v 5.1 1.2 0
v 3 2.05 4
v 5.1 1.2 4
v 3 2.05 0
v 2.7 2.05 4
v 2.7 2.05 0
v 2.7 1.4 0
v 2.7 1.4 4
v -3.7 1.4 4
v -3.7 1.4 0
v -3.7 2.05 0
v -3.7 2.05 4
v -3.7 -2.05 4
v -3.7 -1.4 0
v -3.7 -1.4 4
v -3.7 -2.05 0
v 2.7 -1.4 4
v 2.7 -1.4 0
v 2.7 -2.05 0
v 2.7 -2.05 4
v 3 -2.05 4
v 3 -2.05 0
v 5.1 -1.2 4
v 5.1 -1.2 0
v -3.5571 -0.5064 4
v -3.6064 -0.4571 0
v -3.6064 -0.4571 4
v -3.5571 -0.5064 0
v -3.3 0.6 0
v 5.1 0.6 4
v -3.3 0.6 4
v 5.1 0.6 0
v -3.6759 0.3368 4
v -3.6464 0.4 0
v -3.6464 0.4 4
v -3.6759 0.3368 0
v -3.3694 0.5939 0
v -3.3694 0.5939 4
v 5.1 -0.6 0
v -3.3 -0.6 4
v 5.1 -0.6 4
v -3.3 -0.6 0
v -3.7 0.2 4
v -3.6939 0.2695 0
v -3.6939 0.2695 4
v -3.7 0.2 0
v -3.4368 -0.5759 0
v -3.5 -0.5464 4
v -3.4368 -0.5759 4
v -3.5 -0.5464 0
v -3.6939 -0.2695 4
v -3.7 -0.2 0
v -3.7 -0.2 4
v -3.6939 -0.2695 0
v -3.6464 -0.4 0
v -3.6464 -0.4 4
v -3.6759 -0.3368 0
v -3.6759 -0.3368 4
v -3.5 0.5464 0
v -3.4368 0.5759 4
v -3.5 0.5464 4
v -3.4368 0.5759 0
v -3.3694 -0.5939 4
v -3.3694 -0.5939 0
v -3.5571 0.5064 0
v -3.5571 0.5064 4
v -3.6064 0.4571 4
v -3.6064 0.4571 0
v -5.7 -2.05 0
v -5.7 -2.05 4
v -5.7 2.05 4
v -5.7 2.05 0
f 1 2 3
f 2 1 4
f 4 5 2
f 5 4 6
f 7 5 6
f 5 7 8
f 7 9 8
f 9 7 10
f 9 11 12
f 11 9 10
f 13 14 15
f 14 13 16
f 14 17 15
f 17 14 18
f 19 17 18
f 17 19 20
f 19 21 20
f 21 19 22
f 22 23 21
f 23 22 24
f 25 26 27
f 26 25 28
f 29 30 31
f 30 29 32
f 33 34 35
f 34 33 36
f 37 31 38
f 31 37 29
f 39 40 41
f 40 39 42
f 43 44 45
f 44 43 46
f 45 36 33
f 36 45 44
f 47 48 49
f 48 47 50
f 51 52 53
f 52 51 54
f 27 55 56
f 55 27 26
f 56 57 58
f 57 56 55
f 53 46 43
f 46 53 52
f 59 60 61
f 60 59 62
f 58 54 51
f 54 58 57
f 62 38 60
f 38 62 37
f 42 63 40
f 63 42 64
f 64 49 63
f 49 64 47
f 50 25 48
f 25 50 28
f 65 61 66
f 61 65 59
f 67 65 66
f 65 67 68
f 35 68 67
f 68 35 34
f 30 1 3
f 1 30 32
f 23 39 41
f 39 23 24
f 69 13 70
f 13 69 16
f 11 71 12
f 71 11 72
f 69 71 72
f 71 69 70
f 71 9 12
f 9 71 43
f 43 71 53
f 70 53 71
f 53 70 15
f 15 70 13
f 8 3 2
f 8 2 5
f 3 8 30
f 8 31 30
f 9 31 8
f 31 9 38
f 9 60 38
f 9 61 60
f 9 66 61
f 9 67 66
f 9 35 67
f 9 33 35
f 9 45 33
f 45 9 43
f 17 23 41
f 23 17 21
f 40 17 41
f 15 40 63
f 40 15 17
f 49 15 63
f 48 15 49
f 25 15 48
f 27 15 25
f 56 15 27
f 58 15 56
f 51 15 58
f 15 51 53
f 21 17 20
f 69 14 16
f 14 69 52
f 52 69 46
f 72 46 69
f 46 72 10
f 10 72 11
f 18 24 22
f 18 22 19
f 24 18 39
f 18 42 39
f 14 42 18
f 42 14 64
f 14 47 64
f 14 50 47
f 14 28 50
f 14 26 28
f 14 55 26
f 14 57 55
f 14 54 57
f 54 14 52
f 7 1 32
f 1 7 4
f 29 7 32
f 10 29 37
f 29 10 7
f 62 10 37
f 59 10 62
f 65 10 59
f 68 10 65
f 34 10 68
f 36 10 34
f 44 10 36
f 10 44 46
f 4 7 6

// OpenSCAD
$fn = 50;

difference() {
	union() {
		translate(v = [0, 0, 0]) {
			rotate(a = [90, 0, 0]) {
				difference() {
					union() {
						translate(v = [-5.7, 0, -2.05]) {
							cube(size = [10.8, 4.0, 4.1]);
						}
					}
					union() {
						translate(v = [0, 4.1, 0]) {
							rotate(a = [90, 0, 0]) {
								linear_extrude(height = 4.2) {
									polygon(points = [[-3.7, -1.4], [2.7, -1.4], [2.7, -2.05], [3.0, -2.05], [5.1, -1.2], [5.2, -1.2], [5.2, -2.15], [-3.7, -2.15]]);
								}
							}
						}
						translate(v = [0, 4.1, 0]) {
							rotate(a = [90, 0, 0]) {
								linear_extrude(height = 4.2) {
									polygon(points = [[-3.7, 1.4], [2.7, 1.4], [2.7, 2.05], [3.0, 2.05], [5.1, 1.2], [5.2, 1.2], [5.2, 2.15], [-3.7, 2.15]]);
								}
							}
						}
						translate(v = [0, 4.1, 0]) {
							rotate(a = [90, 0, 0]) {
								linear_extrude(height = 4.2) {
									polygon(points = [[-3.7, 0.2], [-3.693923, 0.269459], [-3.675877, 0.336808], [-3.64641, 0.4], [-3.606418, 0.457115], [-3.557115, 0.506418], [-3.5, 0.54641], [-3.436808, 0.575877], [-3.369459, 0.593923], [-3.3, 0.6], [5.2, 0.6], [5.2, -0.6], [-3.3, -0.6], [-3.369459, -0.593923], [-3.436808, -0.575877], [-3.5, -0.54641], [-3.557115, -0.506418], [-3.606418, -0.457115], [-3.64641, -0.4], [-3.675877, -0.336808], [-3.693923, -0.269459], [-3.7, -0.2]]);
								}
							}
						}
					}
				}
			}
		}
	}
	union();
}
